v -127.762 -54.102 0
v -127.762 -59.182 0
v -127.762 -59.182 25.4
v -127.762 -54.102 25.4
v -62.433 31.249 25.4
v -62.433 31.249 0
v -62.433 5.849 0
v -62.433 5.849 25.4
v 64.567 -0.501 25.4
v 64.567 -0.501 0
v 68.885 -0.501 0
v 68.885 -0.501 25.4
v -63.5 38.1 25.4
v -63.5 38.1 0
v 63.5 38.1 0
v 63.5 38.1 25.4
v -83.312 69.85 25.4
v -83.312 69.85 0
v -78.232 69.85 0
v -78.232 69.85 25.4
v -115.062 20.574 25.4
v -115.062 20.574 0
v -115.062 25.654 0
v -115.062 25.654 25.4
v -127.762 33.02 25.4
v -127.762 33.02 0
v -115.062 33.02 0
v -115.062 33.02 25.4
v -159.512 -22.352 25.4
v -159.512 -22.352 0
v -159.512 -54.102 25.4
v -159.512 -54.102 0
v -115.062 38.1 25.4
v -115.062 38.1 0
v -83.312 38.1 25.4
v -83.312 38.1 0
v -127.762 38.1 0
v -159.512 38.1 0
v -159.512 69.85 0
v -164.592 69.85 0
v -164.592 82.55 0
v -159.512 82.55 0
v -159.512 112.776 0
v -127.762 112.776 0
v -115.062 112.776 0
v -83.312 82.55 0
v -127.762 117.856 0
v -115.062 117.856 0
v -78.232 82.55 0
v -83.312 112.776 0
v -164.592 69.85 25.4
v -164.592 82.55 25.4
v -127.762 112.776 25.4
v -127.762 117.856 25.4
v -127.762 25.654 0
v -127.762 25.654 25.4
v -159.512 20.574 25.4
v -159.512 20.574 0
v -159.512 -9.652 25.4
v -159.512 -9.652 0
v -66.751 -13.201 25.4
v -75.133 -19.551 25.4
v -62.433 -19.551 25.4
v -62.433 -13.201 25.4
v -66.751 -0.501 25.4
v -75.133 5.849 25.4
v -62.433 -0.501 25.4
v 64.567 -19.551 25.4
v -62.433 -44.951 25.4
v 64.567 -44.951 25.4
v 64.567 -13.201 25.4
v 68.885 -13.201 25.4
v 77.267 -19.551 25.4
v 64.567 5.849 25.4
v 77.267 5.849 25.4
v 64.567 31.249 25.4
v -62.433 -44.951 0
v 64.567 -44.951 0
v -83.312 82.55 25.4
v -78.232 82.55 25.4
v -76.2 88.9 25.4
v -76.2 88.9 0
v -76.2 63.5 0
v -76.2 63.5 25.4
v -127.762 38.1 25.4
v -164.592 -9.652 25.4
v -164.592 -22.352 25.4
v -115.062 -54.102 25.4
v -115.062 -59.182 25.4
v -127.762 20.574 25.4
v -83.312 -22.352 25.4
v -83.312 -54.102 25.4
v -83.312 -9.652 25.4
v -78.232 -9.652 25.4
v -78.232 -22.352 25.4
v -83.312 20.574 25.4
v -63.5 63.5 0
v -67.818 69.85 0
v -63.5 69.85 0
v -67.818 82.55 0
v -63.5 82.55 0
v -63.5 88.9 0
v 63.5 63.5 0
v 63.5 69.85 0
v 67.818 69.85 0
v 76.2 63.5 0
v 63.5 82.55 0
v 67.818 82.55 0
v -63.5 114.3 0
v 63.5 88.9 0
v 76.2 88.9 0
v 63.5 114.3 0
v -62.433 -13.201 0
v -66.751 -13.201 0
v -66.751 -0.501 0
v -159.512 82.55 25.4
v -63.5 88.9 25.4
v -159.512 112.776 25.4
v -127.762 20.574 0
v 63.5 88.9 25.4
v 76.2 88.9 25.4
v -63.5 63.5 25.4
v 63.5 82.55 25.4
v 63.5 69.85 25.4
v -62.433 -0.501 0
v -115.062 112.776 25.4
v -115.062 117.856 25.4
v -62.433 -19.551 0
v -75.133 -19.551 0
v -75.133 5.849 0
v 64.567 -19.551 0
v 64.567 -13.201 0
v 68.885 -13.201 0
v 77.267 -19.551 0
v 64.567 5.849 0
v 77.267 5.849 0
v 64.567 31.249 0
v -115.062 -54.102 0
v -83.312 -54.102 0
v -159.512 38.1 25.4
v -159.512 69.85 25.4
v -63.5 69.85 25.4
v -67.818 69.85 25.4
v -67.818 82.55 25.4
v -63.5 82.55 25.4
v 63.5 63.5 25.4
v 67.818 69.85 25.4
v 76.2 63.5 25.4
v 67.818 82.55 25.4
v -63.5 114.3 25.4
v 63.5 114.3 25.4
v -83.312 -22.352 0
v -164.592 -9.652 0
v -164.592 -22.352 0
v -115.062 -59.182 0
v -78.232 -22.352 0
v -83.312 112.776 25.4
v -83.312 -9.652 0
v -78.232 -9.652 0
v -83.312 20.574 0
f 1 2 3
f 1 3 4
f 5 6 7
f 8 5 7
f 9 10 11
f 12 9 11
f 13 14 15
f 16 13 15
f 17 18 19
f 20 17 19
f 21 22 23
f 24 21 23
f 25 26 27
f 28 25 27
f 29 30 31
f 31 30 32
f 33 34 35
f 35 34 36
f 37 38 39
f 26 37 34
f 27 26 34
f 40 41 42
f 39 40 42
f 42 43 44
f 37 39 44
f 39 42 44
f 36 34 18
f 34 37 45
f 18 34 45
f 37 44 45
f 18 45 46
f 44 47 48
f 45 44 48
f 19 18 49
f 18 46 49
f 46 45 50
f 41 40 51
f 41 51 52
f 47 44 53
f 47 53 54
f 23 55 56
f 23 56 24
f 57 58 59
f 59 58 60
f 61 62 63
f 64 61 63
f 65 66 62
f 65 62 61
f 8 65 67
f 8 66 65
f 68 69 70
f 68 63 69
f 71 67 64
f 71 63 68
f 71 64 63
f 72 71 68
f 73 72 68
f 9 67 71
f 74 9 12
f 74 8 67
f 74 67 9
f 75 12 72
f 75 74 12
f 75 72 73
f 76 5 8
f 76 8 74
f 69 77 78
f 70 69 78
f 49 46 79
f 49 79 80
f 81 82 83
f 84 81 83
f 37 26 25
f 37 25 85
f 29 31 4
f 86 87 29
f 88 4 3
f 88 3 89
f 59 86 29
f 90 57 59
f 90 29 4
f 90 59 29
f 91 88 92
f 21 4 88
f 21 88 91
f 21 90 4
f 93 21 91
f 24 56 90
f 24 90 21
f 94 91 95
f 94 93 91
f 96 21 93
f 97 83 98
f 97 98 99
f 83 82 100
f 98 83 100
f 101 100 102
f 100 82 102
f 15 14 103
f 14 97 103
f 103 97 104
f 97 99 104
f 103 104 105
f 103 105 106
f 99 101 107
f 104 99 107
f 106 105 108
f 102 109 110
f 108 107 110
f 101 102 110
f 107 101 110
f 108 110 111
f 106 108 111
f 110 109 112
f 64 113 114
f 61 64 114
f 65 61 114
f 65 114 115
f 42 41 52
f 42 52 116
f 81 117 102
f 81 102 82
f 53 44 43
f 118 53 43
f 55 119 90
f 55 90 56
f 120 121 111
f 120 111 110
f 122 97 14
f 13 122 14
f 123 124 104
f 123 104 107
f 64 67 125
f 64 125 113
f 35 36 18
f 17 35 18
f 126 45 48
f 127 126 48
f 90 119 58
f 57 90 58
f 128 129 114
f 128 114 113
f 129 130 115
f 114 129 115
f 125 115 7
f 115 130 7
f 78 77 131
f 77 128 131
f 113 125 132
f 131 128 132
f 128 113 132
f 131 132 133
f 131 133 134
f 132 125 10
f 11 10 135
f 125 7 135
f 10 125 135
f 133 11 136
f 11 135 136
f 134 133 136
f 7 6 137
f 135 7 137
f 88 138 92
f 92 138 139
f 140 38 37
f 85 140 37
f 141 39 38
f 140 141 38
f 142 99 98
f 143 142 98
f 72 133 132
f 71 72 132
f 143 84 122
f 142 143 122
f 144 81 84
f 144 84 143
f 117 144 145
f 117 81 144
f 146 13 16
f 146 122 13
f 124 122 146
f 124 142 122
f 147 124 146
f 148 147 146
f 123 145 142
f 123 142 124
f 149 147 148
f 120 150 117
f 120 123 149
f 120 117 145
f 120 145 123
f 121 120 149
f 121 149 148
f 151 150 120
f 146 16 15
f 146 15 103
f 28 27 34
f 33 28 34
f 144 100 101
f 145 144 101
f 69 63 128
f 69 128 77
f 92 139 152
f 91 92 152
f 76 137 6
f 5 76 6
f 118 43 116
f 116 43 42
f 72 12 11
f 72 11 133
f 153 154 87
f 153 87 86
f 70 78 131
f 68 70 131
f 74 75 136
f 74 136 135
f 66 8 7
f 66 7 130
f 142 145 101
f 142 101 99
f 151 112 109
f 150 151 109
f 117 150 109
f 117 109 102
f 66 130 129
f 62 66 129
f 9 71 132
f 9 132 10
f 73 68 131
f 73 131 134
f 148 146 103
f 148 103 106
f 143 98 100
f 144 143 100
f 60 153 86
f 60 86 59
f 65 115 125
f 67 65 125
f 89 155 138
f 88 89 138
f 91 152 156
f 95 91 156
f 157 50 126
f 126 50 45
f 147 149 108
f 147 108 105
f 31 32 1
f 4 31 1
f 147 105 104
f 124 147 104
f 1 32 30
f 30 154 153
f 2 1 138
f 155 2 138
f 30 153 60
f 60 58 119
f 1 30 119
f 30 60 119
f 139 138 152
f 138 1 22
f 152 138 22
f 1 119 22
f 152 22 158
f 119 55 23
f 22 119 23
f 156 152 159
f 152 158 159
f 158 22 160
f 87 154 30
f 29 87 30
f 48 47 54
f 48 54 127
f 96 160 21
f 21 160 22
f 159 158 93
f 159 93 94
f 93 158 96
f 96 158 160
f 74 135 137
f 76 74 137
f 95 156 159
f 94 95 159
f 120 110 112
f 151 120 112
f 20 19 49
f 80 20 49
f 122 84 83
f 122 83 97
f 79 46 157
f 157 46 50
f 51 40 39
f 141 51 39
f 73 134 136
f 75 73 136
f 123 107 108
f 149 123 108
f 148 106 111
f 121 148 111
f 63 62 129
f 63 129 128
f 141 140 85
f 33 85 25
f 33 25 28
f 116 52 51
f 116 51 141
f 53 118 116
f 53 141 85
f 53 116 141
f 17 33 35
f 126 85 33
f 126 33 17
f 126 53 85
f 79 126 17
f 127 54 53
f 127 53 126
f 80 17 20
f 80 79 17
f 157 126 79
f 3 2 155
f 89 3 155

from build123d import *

# Parameters (mm, degrees)
F0_W     = 5.08
F0_H     = 12.7
F0_W_2   = 12.7
F0_H_2   = 5.08
F0_W_3   = 2.032
F1_DEPTH = 25.4


with BuildPart() as f1:
    # F0 (on Top) → F1 (new body)
    with BuildSketch(Plane.XY):
        Polygon((-63.5, 63.5), (-63.5, 38.1), (63.5, 38.1), (63.5, 63.5), (63.5, 69.85), (63.5, 76.2), (63.5, 82.55), (63.5, 88.9), (63.5, 114.3), (-63.5, 114.3), (-63.5, 88.9), (-63.5, 82.55), (-63.5, 76.2), (-63.5, 69.85), align=None)
        Polygon((-76.2, 63.5), (-63.5, 63.5), (-63.5, 69.85), (-67.818, 69.85), (-69.85, 69.85), (-69.85, 82.55), (-67.818, 82.55), (-63.5, 82.55), (-63.5, 88.9), (-76.2, 88.9), align=None)
        Polygon((63.5, 69.85), (63.5, 63.5), (76.2, 63.5), (76.2, 88.9), (63.5, 88.9), (63.5, 82.55), (67.818, 82.55), (69.85, 82.55), (69.85, 69.85), (68.2625, 69.85), (67.818, 69.85), (66.04, 69.85), align=None)
        with Locations((-80.772, 76.2)):
            Rectangle(F0_W, F0_H)
        Polygon((-83.312, 69.85), (-83.312, 82.55), (-83.312, 112.775996), (-115.062, 112.775996), (-127.762, 112.775996), (-159.512, 112.775996), (-159.512, 82.55), (-159.512, 69.85), (-159.512, 38.1), (-127.762, 38.1), (-115.062, 38.1), (-83.312, 38.1), align=None)
        with Locations((-121.412, 115.315996)):
            Rectangle(F0_W_2, F0_H_2)
        with Locations((-121.412, 35.56)):
            Rectangle(F0_W_2, F0_H_2)
        with Locations((-162.052, 76.2)):
            Rectangle(F0_W, F0_H)
        Polygon((-62.432505, -19.55114), (-62.432505, -44.95114), (64.567495, -44.95114), (64.567495, -19.55114), (64.567495, -13.20114), (64.567495, -6.85114), (64.567495, -0.50114), (64.567495, 5.84886), (64.567495, 31.24886), (-62.432505, 31.24886), (-62.432505, 5.84886), (-62.432505, -0.50114), (-62.432505, -6.85114), (-62.432505, -13.20114), align=None)
        Polygon((-75.132505, -19.55114), (-62.432505, -19.55114), (-62.432505, -13.20114), (-66.750505, -13.20114), (-68.782505, -13.20114), (-68.782505, -0.50114), (-66.750505, -0.50114), (-62.432505, -0.50114), (-62.432505, 5.84886), (-75.132505, 5.84886), align=None)
        Polygon((64.567495, -13.20114), (64.567495, -19.55114), (77.267495, -19.55114), (77.267495, 5.84886), (64.567495, 5.84886), (64.567495, -0.50114), (68.885495, -0.50114), (70.917495, -0.50114), (70.917495, -13.20114), (69.329995, -13.20114), (68.885495, -13.20114), (67.107495, -13.20114), align=None)
        Polygon((-115.062, -54.102), (-83.312, -54.102), (-83.312, -22.352), (-83.312, -9.652), (-83.312, 20.573996), (-115.062, 20.573996), (-127.762, 20.573996), (-159.512, 20.573996), (-159.512, -9.652), (-159.512, -22.352), (-159.512, -54.102), (-127.762, -54.102), align=None)
        with Locations((-80.772, -16.002)):
            Rectangle(F0_W, F0_H)
        with Locations((-121.412, -56.642)):
            Rectangle(F0_W_2, F0_H_2)
        with Locations((-121.412, 23.113996)):
            Rectangle(F0_W_2, F0_H_2)
        with Locations((-162.052, -16.002)):
            Rectangle(F0_W, F0_H)
        with Locations((-67.766505, -6.85114)):
            Rectangle(F0_W_3, F0_H)
        Polygon((68.885495, -0.50114), (68.885495, -13.20114), (69.329995, -13.20114), (70.917495, -13.20114), (70.917495, -0.50114), align=None)
        Polygon((67.818, 82.55), (67.818, 69.85), (68.2625, 69.85), (69.85, 69.85), (69.85, 82.55), align=None)
        with Locations((-68.834, 76.2)):
            Rectangle(F0_W_3, F0_H)
    extrude(amount=F1_DEPTH)


solid = f1.part
